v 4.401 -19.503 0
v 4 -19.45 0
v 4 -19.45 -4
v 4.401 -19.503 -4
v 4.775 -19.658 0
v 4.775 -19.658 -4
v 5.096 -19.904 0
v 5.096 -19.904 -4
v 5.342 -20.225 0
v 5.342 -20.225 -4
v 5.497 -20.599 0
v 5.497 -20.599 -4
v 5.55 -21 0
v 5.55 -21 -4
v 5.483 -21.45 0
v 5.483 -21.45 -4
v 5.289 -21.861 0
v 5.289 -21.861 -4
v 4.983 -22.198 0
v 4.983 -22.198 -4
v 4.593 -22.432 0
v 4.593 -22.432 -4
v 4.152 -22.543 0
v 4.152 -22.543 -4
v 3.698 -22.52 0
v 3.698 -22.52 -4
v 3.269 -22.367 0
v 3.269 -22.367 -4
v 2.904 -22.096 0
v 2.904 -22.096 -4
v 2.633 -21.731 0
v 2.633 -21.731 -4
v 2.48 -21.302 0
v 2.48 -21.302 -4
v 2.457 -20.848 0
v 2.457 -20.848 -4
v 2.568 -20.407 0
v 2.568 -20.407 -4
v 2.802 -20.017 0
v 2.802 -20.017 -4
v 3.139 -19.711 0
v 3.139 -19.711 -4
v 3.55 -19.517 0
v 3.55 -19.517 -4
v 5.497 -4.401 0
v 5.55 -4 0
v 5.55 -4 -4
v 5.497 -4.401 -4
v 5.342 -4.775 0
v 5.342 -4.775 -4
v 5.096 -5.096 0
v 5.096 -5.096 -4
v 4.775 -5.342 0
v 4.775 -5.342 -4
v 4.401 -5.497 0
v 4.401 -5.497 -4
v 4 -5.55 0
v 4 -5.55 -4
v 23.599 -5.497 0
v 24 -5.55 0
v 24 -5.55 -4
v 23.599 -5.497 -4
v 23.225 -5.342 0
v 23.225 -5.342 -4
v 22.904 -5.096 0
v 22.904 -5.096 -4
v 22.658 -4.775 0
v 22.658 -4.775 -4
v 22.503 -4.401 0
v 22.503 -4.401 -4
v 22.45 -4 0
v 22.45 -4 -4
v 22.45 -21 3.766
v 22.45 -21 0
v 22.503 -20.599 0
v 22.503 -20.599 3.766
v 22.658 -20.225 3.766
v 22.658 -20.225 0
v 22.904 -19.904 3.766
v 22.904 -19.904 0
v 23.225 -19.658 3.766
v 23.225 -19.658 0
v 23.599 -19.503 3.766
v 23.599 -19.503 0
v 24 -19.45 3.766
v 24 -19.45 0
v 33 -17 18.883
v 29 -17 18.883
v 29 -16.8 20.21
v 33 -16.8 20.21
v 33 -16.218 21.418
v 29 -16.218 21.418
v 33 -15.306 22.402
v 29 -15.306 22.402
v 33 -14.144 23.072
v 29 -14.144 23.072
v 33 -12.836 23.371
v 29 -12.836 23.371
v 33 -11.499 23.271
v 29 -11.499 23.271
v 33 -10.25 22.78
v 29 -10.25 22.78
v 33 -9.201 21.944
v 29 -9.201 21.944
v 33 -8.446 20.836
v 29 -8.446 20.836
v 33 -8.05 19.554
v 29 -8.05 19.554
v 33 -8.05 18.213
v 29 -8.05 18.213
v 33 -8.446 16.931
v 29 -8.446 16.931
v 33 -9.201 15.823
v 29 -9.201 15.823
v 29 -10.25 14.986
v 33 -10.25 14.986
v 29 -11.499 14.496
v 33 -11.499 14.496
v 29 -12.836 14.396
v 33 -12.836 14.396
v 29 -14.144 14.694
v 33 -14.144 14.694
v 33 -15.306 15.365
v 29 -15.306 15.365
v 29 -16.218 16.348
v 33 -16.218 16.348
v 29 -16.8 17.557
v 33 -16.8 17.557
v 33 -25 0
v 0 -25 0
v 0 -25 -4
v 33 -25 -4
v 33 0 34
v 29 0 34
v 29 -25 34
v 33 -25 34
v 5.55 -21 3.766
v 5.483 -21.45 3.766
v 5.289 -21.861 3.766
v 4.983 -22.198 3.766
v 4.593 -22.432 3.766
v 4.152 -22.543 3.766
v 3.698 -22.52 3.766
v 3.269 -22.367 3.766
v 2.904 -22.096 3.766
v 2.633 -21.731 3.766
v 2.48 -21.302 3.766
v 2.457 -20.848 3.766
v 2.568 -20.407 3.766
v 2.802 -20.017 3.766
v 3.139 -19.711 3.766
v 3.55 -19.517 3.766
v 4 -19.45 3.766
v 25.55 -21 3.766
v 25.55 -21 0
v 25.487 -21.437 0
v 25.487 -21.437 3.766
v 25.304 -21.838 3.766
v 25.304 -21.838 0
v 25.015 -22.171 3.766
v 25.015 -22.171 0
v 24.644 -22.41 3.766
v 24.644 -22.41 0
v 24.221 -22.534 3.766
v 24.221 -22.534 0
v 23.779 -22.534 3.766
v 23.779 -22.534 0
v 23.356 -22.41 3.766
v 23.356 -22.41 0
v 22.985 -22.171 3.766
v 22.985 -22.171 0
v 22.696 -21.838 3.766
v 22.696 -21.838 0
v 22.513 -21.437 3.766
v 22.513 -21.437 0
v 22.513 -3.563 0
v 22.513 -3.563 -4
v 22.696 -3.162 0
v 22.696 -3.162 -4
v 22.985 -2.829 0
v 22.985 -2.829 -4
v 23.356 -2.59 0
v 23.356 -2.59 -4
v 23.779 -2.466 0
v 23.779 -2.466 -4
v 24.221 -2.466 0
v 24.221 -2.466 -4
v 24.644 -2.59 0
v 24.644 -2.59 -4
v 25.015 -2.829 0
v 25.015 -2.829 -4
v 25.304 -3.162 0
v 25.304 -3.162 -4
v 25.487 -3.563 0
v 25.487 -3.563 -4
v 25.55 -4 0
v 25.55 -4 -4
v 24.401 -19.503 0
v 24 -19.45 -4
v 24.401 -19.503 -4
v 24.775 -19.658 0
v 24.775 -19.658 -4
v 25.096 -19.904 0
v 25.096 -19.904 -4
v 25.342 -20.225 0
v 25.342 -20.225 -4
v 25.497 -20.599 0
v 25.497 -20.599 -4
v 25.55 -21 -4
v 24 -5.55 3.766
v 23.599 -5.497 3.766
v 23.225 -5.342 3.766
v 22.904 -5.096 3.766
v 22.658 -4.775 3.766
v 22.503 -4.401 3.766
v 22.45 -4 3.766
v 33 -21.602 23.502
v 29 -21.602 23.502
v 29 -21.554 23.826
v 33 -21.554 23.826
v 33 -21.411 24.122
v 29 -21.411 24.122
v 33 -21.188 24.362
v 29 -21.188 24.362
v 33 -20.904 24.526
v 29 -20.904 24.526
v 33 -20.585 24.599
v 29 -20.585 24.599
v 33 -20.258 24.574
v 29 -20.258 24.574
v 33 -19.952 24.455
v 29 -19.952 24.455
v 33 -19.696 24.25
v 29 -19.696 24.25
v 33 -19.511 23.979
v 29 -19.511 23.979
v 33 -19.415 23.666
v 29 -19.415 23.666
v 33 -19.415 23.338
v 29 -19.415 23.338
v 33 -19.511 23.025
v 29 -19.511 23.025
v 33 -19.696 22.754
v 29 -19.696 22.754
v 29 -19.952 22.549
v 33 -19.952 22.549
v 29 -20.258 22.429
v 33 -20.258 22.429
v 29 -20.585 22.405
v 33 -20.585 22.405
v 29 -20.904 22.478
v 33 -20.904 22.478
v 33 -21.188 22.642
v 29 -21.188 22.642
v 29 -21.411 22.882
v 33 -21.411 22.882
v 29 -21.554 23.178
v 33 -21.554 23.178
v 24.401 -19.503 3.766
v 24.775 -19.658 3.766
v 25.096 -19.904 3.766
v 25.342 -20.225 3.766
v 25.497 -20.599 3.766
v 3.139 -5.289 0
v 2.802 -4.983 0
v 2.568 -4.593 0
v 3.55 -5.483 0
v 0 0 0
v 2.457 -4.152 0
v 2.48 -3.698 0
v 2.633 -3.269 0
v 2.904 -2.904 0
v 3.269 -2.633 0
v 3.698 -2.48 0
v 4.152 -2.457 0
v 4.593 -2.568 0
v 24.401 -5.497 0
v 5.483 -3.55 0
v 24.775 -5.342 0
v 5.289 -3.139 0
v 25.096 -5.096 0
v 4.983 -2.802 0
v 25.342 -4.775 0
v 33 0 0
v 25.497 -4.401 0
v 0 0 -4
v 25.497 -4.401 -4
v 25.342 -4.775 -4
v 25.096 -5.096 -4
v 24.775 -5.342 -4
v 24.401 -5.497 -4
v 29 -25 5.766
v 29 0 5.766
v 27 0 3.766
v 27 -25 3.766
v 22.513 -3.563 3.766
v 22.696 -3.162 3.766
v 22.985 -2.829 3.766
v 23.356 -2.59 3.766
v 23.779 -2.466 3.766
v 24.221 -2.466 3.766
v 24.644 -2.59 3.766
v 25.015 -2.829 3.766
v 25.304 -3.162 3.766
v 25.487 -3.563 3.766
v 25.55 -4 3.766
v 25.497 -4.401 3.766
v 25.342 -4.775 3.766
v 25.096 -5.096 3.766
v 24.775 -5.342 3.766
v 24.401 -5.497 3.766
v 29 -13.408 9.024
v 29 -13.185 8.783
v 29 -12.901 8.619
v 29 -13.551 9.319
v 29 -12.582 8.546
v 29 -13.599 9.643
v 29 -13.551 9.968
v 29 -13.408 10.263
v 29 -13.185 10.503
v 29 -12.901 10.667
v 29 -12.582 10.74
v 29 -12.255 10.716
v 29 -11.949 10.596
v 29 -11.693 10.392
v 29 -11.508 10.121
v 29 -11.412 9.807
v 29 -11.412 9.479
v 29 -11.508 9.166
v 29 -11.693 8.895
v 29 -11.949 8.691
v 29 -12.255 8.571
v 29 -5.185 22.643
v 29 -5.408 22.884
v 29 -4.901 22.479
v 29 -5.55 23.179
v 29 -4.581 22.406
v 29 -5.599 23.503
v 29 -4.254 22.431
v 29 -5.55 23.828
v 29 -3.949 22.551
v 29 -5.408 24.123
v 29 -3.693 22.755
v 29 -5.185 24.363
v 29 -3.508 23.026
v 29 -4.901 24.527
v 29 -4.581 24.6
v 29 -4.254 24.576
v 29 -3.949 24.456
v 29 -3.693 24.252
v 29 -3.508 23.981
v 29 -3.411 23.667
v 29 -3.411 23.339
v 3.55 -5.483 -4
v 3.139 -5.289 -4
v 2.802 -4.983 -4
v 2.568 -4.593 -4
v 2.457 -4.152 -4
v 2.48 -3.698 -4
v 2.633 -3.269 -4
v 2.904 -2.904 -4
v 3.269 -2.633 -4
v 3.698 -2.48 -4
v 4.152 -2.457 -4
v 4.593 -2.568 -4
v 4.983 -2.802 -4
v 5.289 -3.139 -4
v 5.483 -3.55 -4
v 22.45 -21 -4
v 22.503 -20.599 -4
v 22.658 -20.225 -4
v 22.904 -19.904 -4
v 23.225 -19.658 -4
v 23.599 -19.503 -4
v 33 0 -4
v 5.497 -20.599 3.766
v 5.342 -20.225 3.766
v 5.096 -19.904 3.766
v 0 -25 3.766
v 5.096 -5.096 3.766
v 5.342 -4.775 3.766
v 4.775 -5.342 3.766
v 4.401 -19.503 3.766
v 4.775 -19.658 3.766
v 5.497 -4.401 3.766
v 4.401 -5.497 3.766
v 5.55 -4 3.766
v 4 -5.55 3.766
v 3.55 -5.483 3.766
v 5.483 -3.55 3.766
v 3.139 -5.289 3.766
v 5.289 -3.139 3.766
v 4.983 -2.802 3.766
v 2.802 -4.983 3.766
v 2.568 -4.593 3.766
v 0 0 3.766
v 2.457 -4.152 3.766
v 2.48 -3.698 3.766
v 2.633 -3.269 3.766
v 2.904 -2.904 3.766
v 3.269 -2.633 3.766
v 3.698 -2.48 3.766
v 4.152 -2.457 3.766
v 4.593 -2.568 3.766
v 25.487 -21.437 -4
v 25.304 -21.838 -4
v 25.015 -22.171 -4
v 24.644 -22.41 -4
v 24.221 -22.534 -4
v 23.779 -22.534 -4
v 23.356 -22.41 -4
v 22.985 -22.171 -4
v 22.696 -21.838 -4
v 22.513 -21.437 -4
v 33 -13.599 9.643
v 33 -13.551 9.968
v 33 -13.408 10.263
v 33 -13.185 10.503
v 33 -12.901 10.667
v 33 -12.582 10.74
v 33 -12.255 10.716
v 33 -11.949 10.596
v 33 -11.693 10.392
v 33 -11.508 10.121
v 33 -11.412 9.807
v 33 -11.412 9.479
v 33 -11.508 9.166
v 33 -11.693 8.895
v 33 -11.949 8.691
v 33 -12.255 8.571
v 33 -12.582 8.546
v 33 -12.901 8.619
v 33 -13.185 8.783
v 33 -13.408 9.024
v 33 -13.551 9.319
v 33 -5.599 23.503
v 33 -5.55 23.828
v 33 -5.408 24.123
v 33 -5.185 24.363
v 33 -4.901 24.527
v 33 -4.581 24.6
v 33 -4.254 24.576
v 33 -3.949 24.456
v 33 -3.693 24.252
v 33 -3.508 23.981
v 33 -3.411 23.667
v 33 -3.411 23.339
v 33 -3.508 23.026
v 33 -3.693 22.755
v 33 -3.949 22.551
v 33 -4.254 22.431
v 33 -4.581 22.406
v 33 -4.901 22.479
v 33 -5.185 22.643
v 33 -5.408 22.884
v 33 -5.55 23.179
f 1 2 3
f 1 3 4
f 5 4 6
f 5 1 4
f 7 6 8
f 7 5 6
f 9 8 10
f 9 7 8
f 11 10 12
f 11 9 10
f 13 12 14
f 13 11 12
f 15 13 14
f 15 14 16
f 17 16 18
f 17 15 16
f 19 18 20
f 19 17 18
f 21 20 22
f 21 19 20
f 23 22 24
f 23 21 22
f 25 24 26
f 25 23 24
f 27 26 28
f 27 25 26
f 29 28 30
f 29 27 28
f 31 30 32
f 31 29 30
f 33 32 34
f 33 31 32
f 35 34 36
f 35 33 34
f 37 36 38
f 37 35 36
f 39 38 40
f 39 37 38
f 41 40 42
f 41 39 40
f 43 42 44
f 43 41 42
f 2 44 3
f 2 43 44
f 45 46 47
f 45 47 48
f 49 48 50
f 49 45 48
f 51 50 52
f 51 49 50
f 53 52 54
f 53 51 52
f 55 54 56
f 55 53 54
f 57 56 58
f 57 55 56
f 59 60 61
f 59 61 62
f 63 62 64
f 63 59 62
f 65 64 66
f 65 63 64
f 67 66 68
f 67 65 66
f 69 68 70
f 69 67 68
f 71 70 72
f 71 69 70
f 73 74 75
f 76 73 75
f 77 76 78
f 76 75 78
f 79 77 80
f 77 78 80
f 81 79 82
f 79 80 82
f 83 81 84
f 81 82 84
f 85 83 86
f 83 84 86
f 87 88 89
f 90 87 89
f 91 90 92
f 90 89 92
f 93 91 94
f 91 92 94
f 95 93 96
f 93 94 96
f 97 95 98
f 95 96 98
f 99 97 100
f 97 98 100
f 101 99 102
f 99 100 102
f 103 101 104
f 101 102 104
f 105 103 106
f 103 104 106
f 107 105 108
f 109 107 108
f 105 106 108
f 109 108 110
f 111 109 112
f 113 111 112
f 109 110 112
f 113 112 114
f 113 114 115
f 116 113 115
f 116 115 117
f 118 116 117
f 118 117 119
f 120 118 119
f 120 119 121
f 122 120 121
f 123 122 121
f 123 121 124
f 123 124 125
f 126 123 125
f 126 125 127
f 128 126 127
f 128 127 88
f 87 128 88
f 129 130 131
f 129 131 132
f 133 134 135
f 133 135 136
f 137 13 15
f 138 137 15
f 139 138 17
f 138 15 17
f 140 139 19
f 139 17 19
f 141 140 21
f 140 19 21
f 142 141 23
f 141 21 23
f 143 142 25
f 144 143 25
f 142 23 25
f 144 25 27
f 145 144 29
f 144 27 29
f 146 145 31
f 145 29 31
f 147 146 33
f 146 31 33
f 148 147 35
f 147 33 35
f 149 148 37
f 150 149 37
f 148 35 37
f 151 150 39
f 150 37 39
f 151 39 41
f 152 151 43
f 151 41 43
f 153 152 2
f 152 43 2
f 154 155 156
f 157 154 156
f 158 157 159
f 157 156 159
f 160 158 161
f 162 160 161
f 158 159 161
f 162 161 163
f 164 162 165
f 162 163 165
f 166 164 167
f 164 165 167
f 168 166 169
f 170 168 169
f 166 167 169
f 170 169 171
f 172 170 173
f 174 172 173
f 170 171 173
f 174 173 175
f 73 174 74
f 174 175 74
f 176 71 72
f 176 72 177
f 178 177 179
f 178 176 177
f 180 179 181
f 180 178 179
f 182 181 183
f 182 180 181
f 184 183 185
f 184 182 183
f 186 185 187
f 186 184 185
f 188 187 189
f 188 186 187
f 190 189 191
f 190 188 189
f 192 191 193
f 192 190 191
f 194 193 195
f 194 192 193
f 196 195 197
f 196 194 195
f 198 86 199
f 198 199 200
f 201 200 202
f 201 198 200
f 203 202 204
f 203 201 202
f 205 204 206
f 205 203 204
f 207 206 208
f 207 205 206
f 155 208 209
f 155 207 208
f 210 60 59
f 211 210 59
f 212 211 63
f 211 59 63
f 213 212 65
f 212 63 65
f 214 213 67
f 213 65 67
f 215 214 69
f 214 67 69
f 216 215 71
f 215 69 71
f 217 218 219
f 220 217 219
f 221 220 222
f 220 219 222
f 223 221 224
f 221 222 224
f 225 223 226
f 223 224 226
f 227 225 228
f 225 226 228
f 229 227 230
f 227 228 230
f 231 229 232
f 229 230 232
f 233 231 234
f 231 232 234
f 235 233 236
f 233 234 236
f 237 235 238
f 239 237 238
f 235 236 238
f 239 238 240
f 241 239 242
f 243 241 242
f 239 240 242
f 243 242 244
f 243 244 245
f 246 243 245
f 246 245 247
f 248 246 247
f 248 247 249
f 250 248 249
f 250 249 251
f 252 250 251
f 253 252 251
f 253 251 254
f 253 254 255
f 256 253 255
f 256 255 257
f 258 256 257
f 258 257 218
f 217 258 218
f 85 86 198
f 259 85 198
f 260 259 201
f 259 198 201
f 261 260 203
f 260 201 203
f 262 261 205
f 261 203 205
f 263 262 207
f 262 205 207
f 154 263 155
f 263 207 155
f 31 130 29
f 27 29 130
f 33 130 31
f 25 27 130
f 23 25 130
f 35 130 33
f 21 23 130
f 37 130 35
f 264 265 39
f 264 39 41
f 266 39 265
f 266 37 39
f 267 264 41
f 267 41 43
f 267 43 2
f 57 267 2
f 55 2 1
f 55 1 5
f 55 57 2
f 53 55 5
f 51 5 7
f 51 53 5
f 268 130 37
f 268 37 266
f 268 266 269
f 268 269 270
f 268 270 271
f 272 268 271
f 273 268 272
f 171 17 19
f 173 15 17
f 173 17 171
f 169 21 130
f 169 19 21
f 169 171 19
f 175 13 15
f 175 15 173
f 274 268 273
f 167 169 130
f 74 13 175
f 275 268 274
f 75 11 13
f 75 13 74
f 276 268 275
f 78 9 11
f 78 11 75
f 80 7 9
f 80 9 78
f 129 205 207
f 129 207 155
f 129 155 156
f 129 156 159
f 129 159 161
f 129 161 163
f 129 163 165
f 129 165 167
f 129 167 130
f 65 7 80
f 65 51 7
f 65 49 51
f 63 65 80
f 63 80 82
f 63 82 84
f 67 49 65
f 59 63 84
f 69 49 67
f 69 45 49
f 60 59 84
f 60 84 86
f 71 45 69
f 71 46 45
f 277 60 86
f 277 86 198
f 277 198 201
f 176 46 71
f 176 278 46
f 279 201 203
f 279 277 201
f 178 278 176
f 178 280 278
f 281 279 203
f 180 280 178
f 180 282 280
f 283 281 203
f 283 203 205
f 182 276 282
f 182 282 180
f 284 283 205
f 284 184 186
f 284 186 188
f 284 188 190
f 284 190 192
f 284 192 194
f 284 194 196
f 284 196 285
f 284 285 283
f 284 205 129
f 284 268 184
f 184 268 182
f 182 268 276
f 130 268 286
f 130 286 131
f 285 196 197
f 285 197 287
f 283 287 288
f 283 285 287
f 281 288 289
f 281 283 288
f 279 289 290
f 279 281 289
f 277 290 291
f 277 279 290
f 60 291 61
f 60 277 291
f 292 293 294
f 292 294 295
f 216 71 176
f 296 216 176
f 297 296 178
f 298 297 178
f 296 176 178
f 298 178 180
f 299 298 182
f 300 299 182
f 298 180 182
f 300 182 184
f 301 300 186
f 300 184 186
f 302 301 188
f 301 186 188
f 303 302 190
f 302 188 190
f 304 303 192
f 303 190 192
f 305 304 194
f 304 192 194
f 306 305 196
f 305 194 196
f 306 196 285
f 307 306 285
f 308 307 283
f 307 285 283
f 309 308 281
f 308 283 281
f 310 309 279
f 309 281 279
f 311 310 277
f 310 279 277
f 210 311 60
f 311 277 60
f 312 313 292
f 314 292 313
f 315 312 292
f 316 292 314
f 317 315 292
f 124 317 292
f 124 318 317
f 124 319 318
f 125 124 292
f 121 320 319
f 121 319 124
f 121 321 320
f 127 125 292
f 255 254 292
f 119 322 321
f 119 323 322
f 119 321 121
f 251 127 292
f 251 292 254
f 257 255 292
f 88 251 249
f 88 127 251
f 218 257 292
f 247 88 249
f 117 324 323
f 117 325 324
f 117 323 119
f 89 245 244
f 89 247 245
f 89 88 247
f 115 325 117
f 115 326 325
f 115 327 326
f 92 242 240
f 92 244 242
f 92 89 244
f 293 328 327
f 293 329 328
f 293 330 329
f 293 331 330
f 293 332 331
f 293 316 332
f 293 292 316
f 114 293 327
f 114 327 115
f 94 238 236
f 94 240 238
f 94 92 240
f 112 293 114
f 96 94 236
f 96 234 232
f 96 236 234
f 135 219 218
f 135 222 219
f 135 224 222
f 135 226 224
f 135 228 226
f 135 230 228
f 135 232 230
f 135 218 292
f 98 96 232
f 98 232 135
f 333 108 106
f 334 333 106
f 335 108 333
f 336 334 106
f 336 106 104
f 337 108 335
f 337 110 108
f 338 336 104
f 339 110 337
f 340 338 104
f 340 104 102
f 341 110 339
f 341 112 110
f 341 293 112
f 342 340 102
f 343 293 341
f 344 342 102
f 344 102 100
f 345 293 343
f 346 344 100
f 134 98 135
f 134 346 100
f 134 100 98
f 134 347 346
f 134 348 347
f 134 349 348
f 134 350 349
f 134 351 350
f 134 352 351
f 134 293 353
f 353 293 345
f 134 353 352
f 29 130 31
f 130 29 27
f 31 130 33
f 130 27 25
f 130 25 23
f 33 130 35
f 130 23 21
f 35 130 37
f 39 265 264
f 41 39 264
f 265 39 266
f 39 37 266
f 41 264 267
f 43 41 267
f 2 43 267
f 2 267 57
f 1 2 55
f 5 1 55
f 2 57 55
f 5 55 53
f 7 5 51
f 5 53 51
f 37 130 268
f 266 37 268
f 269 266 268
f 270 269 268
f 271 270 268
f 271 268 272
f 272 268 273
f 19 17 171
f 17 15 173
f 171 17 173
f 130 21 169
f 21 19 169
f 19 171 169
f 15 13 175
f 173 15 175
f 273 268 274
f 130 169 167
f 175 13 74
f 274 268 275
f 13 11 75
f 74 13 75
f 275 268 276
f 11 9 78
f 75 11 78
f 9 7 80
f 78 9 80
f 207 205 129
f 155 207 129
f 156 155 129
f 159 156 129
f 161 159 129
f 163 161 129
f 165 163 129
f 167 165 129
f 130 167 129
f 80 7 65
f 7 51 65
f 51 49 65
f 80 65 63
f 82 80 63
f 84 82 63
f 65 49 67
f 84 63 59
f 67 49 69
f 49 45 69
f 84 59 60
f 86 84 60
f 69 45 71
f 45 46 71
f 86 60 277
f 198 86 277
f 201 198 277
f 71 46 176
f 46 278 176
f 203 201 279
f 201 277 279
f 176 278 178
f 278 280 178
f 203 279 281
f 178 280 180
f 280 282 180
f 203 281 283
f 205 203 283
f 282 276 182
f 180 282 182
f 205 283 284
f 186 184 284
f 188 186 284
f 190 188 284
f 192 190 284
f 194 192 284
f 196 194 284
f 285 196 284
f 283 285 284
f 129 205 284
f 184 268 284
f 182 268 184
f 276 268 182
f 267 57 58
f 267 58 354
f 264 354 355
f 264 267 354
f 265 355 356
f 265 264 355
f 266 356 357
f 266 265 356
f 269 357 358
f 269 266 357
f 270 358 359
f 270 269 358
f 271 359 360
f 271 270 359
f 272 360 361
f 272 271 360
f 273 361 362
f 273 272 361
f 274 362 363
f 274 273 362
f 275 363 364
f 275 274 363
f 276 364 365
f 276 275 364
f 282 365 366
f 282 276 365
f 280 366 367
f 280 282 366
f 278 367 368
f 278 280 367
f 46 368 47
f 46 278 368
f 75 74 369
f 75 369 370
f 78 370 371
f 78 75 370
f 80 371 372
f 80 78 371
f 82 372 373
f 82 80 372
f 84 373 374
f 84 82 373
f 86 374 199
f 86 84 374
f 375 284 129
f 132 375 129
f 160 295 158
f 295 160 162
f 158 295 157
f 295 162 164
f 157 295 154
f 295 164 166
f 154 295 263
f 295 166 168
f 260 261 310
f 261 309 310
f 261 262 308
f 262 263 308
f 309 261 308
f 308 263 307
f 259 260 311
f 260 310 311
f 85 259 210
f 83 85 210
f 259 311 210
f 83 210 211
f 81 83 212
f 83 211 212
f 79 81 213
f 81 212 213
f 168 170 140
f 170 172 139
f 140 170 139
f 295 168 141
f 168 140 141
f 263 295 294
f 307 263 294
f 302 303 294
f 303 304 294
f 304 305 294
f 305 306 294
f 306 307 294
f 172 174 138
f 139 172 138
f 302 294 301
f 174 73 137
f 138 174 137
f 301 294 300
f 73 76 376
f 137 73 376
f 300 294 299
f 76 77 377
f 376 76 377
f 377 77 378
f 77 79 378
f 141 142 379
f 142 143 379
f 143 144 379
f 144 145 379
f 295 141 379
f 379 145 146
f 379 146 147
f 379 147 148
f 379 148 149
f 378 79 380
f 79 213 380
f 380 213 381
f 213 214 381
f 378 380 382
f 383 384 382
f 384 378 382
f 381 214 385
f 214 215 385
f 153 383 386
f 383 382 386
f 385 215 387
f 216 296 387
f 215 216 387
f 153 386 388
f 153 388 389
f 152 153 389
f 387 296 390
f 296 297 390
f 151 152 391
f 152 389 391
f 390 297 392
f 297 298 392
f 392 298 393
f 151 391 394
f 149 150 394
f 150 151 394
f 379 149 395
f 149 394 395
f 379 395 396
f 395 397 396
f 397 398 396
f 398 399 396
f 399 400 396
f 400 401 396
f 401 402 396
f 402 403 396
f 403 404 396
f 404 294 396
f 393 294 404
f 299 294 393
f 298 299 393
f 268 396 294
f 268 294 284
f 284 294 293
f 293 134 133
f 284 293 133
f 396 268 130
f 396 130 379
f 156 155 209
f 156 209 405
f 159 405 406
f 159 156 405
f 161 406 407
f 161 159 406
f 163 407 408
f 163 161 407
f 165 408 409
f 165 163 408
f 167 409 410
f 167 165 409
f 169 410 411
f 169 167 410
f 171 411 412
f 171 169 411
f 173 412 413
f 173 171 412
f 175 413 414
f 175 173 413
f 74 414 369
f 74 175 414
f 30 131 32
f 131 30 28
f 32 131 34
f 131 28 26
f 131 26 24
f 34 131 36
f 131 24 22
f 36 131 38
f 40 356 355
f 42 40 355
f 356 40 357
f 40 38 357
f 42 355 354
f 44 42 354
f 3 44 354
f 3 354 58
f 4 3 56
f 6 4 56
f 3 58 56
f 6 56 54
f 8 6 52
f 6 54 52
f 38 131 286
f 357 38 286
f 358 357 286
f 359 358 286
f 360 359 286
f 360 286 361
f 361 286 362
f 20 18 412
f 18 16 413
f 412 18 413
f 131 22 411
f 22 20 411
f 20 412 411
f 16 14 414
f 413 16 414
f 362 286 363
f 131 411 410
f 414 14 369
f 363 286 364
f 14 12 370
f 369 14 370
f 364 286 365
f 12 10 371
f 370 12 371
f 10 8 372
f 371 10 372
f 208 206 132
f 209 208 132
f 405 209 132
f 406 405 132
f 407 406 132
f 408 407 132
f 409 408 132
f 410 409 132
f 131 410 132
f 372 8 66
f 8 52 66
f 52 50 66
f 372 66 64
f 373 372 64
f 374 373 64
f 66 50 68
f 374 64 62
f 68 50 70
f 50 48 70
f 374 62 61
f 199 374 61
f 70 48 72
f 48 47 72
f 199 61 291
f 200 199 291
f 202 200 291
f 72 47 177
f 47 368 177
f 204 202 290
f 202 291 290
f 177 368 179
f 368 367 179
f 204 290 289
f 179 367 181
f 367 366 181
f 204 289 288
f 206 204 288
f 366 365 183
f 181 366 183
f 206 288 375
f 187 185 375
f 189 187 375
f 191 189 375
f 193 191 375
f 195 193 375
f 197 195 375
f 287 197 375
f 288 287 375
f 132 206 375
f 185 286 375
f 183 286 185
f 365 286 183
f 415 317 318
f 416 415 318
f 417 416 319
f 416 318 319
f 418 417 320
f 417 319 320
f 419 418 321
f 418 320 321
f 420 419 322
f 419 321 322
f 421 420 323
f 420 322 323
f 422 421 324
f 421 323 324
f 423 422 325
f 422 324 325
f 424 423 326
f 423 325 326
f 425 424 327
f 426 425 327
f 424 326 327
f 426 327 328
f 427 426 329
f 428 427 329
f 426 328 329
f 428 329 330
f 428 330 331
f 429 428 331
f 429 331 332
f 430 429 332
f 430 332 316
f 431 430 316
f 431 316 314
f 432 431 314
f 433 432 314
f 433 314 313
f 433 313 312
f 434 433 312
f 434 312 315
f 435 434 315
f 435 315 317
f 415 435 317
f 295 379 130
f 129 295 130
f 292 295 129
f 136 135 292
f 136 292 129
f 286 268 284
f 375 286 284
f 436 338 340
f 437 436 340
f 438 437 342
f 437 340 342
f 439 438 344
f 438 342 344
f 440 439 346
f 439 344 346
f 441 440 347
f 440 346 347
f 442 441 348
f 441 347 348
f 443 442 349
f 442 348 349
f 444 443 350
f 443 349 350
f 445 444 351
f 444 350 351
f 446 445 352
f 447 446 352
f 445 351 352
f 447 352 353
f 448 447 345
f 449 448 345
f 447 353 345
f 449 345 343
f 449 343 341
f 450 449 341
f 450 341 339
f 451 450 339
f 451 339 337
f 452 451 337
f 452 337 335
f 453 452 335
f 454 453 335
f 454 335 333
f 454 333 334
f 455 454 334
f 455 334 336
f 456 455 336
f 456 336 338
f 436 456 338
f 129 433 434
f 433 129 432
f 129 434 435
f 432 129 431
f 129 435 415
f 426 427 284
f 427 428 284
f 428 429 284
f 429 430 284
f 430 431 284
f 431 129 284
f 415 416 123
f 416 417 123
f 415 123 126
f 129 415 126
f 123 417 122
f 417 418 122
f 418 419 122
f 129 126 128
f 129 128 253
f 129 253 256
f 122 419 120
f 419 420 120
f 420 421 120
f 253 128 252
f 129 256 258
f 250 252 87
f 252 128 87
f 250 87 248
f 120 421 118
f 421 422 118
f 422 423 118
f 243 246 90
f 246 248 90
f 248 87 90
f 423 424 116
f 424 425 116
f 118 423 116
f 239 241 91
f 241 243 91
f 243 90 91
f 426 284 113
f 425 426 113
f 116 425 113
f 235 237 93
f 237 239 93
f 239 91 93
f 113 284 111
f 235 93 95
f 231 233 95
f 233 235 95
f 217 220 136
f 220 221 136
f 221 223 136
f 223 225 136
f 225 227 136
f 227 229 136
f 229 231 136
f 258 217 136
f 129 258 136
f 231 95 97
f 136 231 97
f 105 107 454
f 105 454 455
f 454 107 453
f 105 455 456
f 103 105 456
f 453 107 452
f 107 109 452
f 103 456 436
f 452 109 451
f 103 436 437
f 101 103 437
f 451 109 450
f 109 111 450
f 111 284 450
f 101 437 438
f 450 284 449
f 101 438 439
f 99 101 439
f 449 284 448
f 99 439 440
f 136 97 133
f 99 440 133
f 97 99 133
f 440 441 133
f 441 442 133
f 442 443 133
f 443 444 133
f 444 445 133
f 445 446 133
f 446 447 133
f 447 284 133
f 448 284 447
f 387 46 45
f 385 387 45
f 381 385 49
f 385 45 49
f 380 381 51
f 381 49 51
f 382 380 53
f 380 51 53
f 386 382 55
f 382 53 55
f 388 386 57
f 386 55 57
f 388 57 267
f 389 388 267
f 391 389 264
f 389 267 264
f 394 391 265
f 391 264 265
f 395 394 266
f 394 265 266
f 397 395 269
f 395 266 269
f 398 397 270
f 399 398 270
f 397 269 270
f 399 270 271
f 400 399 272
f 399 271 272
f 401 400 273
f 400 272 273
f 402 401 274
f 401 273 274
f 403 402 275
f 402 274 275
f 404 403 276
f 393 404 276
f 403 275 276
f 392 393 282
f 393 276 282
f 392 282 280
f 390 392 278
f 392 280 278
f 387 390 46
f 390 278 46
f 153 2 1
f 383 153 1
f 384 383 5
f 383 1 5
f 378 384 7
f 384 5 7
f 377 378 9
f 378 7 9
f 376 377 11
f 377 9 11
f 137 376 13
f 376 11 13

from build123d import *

# Parameters (mm, degrees)
F0_W     = 29
F0_H     = 3.76617883
F0_W_2   = 4
F0_H_2   = 30.23382117
F1_DEPTH = 25
F2_R     = 1.1
F2_R_2   = 4.5
F3_DEPTH = 25
F5_DEPTH = 25
F6_DEPTH = 4
F7_SIZE  = 2


with BuildPart() as f1:
    # F0 (on Front) → F1 (new body)
    with BuildSketch(Plane.XZ):
        with Locations((14.5, 1.883089415)):
            Rectangle(F0_W, F0_H)
        with Locations((31, 1.883089415)):
            Rectangle(F0_W_2, F0_H)
        with Locations((31, 18.883089415)):
            Rectangle(F0_W_2, F0_H_2)
    extrude(amount=F1_DEPTH)

    # F2 (on face) → F3 (cut)
    with BuildSketch(Plane(origin=(29, 0, 0), x_dir=(0, -1, 0), z_dir=(-1, 0, 0))):
        with Locations((4.4991129581, 23.5033831761)):
            Circle(F2_R)
        with Locations((20.5024139551, 23.5019139032)):
            Circle(F2_R)
        with Locations((12.4994910289, 9.6433833319)):
            Circle(F2_R)
        with Locations((12.5, 18.8833833319)):
            Circle(F2_R_2)
    extrude(amount=-F3_DEPTH, mode=Mode.SUBTRACT)

    # F4 (on face) → F5 (cut)
    with BuildSketch(Plane(origin=(0, 0, 0), x_dir=(1, 0, 0), z_dir=(0, 0, -1))):
        with BuildLine():
            ThreePointArc((5.55, 21), (2.9039844892, 22.0960155108), (4, 19.45))
            Line((4, 19.45), (4, 21))
            Line((4, 21), (5.55, 21))
        make_face()
        with BuildLine():
            Line((4, 21), (4, 19.45))
            ThreePointArc((4, 19.45), (5.0960155108, 19.9039844892), (5.55, 21))
            Line((5.55, 21), (4, 21))
        make_face()
        with BuildLine():
            ThreePointArc((25.55, 21), (24, 22.55), (22.45, 21))
            Line((22.45, 21), (24, 21))
            Line((24, 21), (24, 19.45))
            ThreePointArc((24, 19.45), (25.0960155108, 19.9039844892), (25.55, 21))
        make_face()
        with BuildLine():
            Line((24, 21), (22.45, 21))
            ThreePointArc((22.45, 21), (22.9039844892, 19.9039844892), (24, 19.45))
            Line((24, 19.45), (24, 21))
        make_face()
        with BuildLine():
            Line((24, 4), (22.45, 4))
            ThreePointArc((22.45, 4), (24, 2.45), (25.55, 4))
            ThreePointArc((25.55, 4), (25.0960155108, 5.0960155108), (24, 5.55))
            Line((24, 5.55), (24, 4))
        make_face()
        with BuildLine():
            ThreePointArc((24, 5.55), (22.9039844892, 5.0960155108), (22.45, 4))
            Line((22.45, 4), (24, 4))
            Line((24, 4), (24, 5.55))
        make_face()
        with BuildLine():
            Line((4, 5.55), (4, 4))
            Line((4, 4), (5.55, 4))
            ThreePointArc((5.55, 4), (5.0960155108, 5.0960155108), (4, 5.55))
        make_face()
        with BuildLine():
            Line((5.55, 4), (4, 4))
            Line((4, 4), (4, 5.55))
            ThreePointArc((4, 5.55), (2.9039844892, 2.9039844892), (5.55, 4))
        make_face()
    extrude(amount=-F5_DEPTH, mode=Mode.SUBTRACT)


with BuildPart() as f6:
    # F6 (new): a face of the model
    f6_faces = [f1.part.faces().sort_by_distance(p)[0] for p in [
        (16.5949621048, -12.5, 0),
    ]]
    extrude(f6_faces, amount=F6_DEPTH)


with BuildPart() as f1_1:
    add(f1.part)

    # F7
    f7_edges = [f1_1.edges().sort_by_distance(p)[0] for p in [
        (29, -12.5, 3.766179),
    ]]
    chamfer(f7_edges, length=F7_SIZE)


solid = Compound([f6.part, f1_1.part])
